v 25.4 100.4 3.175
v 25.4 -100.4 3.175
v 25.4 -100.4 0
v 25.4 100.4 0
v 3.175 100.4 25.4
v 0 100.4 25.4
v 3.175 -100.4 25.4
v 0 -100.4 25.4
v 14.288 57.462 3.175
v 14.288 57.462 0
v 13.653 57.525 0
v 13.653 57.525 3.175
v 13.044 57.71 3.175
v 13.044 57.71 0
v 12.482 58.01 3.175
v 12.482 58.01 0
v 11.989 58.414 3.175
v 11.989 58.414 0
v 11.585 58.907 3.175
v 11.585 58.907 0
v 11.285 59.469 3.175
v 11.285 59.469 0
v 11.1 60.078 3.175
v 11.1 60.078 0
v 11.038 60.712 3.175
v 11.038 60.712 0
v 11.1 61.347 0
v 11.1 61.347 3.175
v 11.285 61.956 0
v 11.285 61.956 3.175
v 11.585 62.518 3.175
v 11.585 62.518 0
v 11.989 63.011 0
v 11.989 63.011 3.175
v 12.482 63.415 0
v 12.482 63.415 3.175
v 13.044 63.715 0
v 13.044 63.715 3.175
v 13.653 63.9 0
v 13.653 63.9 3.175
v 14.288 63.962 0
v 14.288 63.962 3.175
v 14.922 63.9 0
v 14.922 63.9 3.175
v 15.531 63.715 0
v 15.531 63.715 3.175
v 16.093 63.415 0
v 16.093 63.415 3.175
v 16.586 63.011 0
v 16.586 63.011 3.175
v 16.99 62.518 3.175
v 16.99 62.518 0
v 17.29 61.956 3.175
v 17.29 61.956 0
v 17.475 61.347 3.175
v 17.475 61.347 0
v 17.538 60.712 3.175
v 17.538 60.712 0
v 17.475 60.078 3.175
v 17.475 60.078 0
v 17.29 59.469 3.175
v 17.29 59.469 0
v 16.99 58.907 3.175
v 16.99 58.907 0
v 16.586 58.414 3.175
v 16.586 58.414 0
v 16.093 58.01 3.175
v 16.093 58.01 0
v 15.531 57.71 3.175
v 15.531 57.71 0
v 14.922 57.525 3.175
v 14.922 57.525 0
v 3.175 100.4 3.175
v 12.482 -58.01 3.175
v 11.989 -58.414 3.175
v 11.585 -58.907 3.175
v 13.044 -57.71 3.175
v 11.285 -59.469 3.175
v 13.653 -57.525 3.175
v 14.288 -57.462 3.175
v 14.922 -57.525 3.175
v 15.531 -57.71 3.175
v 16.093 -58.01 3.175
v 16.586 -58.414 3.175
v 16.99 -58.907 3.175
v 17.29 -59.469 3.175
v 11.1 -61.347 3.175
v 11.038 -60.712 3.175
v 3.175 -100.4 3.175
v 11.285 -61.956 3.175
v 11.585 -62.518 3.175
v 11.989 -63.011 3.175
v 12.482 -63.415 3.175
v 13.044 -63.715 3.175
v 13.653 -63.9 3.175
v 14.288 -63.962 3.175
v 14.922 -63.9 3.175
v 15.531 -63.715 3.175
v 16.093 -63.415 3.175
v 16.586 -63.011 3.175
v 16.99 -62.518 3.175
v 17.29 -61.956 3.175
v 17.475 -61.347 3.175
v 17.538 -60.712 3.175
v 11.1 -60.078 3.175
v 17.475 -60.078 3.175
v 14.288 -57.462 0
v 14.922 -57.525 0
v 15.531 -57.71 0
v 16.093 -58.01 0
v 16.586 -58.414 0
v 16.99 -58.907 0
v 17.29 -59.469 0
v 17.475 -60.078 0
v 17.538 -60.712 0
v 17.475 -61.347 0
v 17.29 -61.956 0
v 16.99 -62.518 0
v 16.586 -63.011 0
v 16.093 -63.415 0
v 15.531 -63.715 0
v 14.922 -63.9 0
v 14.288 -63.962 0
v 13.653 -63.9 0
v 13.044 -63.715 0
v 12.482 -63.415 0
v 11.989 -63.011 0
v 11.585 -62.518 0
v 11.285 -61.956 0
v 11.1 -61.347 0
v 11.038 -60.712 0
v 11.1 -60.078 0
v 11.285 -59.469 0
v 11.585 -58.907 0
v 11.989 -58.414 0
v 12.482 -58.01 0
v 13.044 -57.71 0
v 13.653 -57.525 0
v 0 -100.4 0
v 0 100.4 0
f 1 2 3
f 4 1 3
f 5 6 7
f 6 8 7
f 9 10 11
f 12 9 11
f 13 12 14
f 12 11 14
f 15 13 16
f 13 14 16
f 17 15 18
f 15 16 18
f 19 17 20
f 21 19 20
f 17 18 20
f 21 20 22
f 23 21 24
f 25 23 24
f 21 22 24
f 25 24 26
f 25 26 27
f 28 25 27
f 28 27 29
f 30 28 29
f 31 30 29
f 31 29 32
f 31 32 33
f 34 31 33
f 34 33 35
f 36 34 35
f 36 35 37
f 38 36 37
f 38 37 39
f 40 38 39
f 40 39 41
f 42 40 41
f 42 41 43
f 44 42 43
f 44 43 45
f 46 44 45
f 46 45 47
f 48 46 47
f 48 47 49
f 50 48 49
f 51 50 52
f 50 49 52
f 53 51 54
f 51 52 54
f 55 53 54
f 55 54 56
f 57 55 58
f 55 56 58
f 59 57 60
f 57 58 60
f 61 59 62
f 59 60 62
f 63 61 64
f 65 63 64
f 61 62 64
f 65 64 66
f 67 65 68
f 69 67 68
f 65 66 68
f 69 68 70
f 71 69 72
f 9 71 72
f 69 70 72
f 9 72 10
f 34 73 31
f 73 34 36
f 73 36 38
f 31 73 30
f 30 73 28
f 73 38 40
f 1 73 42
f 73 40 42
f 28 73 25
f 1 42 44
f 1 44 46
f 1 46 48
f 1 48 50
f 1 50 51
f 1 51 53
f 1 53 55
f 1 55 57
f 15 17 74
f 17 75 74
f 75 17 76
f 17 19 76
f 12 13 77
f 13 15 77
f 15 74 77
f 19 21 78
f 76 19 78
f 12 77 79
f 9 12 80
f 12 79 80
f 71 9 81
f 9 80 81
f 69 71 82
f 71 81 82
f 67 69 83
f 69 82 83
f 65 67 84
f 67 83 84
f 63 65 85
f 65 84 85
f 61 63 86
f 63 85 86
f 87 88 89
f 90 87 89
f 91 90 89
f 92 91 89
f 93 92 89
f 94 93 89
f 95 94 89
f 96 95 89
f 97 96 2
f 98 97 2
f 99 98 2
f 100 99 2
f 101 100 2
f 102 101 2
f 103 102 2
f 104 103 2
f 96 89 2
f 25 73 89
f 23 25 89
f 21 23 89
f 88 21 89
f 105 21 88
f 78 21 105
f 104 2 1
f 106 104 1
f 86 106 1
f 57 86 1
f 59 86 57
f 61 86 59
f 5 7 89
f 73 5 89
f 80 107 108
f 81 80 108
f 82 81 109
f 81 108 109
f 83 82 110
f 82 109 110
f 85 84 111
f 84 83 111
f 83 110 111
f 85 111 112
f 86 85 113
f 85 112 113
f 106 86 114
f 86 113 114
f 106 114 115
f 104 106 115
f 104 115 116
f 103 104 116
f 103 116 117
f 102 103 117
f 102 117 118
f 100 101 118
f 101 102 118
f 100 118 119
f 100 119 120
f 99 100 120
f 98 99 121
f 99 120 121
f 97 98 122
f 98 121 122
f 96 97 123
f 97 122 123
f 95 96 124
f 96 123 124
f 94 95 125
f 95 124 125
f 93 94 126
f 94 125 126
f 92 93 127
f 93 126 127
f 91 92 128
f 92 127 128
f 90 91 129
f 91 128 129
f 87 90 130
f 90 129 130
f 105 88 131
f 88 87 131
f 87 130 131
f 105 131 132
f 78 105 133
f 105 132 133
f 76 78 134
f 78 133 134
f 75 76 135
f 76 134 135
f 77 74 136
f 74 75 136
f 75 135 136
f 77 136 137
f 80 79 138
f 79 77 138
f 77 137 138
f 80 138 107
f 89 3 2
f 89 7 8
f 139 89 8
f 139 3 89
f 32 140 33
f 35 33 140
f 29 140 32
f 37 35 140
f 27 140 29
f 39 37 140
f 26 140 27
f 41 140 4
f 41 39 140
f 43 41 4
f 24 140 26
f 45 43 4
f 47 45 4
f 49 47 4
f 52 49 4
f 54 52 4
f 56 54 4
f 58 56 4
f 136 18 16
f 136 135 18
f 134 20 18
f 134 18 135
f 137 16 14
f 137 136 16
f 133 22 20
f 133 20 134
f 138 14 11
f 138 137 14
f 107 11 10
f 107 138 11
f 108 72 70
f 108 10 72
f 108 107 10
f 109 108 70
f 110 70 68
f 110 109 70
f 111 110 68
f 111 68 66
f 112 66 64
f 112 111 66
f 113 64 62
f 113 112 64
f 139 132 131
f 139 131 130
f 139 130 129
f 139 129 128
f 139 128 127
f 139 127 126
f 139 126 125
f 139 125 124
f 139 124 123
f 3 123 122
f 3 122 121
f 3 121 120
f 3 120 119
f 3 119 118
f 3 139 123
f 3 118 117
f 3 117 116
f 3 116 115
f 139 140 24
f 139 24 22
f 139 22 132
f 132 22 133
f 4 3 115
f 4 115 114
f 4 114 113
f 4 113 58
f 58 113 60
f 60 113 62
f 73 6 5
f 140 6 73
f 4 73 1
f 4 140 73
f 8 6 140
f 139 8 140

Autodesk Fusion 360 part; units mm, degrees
sketch "Sketch1" plane through (0, 0, 0) normal (0, 1, 0) x (1, 0, 0)
  line L0 (0, -25.4) -> (0, 0)
  line L1 (0, 0) -> (25.4, 0)
  line L2 (12.7, -12.7) -> (11.05, -11.05) construction
  line L3 (3.175, -25.4) -> (3.175, -3.175)
  line L4 (3.175, -3.175) -> (25.4, -3.175)
  line L5 (25.4, -3.175) -> (25.4, 0)
  line L6 (0, -25.4) -> (3.175, -25.4)
  dimension "d1" = 25.4
  dimension "d2" = 25.4
  dimension "d13" = 3.175
extrude "Extrude1" add sketch "Sketch1" along normal blind 100.4
hole "Hole3" at (14.2875, 60.7125, 3.175) direction (0, 0, -1) diameter 6.5 depth 30 tip angle 118
mirror "Mirror2" about plane through (0, 0, 0) normal (0, -1, 0) of bodies 1 merged
equation "d29 = ( 22.225 / 2 ) * 1 mm"
equation "d30 = ( 22.225 / 2 ) * 1 mm + 25.4 mm + 3.175 mm"
